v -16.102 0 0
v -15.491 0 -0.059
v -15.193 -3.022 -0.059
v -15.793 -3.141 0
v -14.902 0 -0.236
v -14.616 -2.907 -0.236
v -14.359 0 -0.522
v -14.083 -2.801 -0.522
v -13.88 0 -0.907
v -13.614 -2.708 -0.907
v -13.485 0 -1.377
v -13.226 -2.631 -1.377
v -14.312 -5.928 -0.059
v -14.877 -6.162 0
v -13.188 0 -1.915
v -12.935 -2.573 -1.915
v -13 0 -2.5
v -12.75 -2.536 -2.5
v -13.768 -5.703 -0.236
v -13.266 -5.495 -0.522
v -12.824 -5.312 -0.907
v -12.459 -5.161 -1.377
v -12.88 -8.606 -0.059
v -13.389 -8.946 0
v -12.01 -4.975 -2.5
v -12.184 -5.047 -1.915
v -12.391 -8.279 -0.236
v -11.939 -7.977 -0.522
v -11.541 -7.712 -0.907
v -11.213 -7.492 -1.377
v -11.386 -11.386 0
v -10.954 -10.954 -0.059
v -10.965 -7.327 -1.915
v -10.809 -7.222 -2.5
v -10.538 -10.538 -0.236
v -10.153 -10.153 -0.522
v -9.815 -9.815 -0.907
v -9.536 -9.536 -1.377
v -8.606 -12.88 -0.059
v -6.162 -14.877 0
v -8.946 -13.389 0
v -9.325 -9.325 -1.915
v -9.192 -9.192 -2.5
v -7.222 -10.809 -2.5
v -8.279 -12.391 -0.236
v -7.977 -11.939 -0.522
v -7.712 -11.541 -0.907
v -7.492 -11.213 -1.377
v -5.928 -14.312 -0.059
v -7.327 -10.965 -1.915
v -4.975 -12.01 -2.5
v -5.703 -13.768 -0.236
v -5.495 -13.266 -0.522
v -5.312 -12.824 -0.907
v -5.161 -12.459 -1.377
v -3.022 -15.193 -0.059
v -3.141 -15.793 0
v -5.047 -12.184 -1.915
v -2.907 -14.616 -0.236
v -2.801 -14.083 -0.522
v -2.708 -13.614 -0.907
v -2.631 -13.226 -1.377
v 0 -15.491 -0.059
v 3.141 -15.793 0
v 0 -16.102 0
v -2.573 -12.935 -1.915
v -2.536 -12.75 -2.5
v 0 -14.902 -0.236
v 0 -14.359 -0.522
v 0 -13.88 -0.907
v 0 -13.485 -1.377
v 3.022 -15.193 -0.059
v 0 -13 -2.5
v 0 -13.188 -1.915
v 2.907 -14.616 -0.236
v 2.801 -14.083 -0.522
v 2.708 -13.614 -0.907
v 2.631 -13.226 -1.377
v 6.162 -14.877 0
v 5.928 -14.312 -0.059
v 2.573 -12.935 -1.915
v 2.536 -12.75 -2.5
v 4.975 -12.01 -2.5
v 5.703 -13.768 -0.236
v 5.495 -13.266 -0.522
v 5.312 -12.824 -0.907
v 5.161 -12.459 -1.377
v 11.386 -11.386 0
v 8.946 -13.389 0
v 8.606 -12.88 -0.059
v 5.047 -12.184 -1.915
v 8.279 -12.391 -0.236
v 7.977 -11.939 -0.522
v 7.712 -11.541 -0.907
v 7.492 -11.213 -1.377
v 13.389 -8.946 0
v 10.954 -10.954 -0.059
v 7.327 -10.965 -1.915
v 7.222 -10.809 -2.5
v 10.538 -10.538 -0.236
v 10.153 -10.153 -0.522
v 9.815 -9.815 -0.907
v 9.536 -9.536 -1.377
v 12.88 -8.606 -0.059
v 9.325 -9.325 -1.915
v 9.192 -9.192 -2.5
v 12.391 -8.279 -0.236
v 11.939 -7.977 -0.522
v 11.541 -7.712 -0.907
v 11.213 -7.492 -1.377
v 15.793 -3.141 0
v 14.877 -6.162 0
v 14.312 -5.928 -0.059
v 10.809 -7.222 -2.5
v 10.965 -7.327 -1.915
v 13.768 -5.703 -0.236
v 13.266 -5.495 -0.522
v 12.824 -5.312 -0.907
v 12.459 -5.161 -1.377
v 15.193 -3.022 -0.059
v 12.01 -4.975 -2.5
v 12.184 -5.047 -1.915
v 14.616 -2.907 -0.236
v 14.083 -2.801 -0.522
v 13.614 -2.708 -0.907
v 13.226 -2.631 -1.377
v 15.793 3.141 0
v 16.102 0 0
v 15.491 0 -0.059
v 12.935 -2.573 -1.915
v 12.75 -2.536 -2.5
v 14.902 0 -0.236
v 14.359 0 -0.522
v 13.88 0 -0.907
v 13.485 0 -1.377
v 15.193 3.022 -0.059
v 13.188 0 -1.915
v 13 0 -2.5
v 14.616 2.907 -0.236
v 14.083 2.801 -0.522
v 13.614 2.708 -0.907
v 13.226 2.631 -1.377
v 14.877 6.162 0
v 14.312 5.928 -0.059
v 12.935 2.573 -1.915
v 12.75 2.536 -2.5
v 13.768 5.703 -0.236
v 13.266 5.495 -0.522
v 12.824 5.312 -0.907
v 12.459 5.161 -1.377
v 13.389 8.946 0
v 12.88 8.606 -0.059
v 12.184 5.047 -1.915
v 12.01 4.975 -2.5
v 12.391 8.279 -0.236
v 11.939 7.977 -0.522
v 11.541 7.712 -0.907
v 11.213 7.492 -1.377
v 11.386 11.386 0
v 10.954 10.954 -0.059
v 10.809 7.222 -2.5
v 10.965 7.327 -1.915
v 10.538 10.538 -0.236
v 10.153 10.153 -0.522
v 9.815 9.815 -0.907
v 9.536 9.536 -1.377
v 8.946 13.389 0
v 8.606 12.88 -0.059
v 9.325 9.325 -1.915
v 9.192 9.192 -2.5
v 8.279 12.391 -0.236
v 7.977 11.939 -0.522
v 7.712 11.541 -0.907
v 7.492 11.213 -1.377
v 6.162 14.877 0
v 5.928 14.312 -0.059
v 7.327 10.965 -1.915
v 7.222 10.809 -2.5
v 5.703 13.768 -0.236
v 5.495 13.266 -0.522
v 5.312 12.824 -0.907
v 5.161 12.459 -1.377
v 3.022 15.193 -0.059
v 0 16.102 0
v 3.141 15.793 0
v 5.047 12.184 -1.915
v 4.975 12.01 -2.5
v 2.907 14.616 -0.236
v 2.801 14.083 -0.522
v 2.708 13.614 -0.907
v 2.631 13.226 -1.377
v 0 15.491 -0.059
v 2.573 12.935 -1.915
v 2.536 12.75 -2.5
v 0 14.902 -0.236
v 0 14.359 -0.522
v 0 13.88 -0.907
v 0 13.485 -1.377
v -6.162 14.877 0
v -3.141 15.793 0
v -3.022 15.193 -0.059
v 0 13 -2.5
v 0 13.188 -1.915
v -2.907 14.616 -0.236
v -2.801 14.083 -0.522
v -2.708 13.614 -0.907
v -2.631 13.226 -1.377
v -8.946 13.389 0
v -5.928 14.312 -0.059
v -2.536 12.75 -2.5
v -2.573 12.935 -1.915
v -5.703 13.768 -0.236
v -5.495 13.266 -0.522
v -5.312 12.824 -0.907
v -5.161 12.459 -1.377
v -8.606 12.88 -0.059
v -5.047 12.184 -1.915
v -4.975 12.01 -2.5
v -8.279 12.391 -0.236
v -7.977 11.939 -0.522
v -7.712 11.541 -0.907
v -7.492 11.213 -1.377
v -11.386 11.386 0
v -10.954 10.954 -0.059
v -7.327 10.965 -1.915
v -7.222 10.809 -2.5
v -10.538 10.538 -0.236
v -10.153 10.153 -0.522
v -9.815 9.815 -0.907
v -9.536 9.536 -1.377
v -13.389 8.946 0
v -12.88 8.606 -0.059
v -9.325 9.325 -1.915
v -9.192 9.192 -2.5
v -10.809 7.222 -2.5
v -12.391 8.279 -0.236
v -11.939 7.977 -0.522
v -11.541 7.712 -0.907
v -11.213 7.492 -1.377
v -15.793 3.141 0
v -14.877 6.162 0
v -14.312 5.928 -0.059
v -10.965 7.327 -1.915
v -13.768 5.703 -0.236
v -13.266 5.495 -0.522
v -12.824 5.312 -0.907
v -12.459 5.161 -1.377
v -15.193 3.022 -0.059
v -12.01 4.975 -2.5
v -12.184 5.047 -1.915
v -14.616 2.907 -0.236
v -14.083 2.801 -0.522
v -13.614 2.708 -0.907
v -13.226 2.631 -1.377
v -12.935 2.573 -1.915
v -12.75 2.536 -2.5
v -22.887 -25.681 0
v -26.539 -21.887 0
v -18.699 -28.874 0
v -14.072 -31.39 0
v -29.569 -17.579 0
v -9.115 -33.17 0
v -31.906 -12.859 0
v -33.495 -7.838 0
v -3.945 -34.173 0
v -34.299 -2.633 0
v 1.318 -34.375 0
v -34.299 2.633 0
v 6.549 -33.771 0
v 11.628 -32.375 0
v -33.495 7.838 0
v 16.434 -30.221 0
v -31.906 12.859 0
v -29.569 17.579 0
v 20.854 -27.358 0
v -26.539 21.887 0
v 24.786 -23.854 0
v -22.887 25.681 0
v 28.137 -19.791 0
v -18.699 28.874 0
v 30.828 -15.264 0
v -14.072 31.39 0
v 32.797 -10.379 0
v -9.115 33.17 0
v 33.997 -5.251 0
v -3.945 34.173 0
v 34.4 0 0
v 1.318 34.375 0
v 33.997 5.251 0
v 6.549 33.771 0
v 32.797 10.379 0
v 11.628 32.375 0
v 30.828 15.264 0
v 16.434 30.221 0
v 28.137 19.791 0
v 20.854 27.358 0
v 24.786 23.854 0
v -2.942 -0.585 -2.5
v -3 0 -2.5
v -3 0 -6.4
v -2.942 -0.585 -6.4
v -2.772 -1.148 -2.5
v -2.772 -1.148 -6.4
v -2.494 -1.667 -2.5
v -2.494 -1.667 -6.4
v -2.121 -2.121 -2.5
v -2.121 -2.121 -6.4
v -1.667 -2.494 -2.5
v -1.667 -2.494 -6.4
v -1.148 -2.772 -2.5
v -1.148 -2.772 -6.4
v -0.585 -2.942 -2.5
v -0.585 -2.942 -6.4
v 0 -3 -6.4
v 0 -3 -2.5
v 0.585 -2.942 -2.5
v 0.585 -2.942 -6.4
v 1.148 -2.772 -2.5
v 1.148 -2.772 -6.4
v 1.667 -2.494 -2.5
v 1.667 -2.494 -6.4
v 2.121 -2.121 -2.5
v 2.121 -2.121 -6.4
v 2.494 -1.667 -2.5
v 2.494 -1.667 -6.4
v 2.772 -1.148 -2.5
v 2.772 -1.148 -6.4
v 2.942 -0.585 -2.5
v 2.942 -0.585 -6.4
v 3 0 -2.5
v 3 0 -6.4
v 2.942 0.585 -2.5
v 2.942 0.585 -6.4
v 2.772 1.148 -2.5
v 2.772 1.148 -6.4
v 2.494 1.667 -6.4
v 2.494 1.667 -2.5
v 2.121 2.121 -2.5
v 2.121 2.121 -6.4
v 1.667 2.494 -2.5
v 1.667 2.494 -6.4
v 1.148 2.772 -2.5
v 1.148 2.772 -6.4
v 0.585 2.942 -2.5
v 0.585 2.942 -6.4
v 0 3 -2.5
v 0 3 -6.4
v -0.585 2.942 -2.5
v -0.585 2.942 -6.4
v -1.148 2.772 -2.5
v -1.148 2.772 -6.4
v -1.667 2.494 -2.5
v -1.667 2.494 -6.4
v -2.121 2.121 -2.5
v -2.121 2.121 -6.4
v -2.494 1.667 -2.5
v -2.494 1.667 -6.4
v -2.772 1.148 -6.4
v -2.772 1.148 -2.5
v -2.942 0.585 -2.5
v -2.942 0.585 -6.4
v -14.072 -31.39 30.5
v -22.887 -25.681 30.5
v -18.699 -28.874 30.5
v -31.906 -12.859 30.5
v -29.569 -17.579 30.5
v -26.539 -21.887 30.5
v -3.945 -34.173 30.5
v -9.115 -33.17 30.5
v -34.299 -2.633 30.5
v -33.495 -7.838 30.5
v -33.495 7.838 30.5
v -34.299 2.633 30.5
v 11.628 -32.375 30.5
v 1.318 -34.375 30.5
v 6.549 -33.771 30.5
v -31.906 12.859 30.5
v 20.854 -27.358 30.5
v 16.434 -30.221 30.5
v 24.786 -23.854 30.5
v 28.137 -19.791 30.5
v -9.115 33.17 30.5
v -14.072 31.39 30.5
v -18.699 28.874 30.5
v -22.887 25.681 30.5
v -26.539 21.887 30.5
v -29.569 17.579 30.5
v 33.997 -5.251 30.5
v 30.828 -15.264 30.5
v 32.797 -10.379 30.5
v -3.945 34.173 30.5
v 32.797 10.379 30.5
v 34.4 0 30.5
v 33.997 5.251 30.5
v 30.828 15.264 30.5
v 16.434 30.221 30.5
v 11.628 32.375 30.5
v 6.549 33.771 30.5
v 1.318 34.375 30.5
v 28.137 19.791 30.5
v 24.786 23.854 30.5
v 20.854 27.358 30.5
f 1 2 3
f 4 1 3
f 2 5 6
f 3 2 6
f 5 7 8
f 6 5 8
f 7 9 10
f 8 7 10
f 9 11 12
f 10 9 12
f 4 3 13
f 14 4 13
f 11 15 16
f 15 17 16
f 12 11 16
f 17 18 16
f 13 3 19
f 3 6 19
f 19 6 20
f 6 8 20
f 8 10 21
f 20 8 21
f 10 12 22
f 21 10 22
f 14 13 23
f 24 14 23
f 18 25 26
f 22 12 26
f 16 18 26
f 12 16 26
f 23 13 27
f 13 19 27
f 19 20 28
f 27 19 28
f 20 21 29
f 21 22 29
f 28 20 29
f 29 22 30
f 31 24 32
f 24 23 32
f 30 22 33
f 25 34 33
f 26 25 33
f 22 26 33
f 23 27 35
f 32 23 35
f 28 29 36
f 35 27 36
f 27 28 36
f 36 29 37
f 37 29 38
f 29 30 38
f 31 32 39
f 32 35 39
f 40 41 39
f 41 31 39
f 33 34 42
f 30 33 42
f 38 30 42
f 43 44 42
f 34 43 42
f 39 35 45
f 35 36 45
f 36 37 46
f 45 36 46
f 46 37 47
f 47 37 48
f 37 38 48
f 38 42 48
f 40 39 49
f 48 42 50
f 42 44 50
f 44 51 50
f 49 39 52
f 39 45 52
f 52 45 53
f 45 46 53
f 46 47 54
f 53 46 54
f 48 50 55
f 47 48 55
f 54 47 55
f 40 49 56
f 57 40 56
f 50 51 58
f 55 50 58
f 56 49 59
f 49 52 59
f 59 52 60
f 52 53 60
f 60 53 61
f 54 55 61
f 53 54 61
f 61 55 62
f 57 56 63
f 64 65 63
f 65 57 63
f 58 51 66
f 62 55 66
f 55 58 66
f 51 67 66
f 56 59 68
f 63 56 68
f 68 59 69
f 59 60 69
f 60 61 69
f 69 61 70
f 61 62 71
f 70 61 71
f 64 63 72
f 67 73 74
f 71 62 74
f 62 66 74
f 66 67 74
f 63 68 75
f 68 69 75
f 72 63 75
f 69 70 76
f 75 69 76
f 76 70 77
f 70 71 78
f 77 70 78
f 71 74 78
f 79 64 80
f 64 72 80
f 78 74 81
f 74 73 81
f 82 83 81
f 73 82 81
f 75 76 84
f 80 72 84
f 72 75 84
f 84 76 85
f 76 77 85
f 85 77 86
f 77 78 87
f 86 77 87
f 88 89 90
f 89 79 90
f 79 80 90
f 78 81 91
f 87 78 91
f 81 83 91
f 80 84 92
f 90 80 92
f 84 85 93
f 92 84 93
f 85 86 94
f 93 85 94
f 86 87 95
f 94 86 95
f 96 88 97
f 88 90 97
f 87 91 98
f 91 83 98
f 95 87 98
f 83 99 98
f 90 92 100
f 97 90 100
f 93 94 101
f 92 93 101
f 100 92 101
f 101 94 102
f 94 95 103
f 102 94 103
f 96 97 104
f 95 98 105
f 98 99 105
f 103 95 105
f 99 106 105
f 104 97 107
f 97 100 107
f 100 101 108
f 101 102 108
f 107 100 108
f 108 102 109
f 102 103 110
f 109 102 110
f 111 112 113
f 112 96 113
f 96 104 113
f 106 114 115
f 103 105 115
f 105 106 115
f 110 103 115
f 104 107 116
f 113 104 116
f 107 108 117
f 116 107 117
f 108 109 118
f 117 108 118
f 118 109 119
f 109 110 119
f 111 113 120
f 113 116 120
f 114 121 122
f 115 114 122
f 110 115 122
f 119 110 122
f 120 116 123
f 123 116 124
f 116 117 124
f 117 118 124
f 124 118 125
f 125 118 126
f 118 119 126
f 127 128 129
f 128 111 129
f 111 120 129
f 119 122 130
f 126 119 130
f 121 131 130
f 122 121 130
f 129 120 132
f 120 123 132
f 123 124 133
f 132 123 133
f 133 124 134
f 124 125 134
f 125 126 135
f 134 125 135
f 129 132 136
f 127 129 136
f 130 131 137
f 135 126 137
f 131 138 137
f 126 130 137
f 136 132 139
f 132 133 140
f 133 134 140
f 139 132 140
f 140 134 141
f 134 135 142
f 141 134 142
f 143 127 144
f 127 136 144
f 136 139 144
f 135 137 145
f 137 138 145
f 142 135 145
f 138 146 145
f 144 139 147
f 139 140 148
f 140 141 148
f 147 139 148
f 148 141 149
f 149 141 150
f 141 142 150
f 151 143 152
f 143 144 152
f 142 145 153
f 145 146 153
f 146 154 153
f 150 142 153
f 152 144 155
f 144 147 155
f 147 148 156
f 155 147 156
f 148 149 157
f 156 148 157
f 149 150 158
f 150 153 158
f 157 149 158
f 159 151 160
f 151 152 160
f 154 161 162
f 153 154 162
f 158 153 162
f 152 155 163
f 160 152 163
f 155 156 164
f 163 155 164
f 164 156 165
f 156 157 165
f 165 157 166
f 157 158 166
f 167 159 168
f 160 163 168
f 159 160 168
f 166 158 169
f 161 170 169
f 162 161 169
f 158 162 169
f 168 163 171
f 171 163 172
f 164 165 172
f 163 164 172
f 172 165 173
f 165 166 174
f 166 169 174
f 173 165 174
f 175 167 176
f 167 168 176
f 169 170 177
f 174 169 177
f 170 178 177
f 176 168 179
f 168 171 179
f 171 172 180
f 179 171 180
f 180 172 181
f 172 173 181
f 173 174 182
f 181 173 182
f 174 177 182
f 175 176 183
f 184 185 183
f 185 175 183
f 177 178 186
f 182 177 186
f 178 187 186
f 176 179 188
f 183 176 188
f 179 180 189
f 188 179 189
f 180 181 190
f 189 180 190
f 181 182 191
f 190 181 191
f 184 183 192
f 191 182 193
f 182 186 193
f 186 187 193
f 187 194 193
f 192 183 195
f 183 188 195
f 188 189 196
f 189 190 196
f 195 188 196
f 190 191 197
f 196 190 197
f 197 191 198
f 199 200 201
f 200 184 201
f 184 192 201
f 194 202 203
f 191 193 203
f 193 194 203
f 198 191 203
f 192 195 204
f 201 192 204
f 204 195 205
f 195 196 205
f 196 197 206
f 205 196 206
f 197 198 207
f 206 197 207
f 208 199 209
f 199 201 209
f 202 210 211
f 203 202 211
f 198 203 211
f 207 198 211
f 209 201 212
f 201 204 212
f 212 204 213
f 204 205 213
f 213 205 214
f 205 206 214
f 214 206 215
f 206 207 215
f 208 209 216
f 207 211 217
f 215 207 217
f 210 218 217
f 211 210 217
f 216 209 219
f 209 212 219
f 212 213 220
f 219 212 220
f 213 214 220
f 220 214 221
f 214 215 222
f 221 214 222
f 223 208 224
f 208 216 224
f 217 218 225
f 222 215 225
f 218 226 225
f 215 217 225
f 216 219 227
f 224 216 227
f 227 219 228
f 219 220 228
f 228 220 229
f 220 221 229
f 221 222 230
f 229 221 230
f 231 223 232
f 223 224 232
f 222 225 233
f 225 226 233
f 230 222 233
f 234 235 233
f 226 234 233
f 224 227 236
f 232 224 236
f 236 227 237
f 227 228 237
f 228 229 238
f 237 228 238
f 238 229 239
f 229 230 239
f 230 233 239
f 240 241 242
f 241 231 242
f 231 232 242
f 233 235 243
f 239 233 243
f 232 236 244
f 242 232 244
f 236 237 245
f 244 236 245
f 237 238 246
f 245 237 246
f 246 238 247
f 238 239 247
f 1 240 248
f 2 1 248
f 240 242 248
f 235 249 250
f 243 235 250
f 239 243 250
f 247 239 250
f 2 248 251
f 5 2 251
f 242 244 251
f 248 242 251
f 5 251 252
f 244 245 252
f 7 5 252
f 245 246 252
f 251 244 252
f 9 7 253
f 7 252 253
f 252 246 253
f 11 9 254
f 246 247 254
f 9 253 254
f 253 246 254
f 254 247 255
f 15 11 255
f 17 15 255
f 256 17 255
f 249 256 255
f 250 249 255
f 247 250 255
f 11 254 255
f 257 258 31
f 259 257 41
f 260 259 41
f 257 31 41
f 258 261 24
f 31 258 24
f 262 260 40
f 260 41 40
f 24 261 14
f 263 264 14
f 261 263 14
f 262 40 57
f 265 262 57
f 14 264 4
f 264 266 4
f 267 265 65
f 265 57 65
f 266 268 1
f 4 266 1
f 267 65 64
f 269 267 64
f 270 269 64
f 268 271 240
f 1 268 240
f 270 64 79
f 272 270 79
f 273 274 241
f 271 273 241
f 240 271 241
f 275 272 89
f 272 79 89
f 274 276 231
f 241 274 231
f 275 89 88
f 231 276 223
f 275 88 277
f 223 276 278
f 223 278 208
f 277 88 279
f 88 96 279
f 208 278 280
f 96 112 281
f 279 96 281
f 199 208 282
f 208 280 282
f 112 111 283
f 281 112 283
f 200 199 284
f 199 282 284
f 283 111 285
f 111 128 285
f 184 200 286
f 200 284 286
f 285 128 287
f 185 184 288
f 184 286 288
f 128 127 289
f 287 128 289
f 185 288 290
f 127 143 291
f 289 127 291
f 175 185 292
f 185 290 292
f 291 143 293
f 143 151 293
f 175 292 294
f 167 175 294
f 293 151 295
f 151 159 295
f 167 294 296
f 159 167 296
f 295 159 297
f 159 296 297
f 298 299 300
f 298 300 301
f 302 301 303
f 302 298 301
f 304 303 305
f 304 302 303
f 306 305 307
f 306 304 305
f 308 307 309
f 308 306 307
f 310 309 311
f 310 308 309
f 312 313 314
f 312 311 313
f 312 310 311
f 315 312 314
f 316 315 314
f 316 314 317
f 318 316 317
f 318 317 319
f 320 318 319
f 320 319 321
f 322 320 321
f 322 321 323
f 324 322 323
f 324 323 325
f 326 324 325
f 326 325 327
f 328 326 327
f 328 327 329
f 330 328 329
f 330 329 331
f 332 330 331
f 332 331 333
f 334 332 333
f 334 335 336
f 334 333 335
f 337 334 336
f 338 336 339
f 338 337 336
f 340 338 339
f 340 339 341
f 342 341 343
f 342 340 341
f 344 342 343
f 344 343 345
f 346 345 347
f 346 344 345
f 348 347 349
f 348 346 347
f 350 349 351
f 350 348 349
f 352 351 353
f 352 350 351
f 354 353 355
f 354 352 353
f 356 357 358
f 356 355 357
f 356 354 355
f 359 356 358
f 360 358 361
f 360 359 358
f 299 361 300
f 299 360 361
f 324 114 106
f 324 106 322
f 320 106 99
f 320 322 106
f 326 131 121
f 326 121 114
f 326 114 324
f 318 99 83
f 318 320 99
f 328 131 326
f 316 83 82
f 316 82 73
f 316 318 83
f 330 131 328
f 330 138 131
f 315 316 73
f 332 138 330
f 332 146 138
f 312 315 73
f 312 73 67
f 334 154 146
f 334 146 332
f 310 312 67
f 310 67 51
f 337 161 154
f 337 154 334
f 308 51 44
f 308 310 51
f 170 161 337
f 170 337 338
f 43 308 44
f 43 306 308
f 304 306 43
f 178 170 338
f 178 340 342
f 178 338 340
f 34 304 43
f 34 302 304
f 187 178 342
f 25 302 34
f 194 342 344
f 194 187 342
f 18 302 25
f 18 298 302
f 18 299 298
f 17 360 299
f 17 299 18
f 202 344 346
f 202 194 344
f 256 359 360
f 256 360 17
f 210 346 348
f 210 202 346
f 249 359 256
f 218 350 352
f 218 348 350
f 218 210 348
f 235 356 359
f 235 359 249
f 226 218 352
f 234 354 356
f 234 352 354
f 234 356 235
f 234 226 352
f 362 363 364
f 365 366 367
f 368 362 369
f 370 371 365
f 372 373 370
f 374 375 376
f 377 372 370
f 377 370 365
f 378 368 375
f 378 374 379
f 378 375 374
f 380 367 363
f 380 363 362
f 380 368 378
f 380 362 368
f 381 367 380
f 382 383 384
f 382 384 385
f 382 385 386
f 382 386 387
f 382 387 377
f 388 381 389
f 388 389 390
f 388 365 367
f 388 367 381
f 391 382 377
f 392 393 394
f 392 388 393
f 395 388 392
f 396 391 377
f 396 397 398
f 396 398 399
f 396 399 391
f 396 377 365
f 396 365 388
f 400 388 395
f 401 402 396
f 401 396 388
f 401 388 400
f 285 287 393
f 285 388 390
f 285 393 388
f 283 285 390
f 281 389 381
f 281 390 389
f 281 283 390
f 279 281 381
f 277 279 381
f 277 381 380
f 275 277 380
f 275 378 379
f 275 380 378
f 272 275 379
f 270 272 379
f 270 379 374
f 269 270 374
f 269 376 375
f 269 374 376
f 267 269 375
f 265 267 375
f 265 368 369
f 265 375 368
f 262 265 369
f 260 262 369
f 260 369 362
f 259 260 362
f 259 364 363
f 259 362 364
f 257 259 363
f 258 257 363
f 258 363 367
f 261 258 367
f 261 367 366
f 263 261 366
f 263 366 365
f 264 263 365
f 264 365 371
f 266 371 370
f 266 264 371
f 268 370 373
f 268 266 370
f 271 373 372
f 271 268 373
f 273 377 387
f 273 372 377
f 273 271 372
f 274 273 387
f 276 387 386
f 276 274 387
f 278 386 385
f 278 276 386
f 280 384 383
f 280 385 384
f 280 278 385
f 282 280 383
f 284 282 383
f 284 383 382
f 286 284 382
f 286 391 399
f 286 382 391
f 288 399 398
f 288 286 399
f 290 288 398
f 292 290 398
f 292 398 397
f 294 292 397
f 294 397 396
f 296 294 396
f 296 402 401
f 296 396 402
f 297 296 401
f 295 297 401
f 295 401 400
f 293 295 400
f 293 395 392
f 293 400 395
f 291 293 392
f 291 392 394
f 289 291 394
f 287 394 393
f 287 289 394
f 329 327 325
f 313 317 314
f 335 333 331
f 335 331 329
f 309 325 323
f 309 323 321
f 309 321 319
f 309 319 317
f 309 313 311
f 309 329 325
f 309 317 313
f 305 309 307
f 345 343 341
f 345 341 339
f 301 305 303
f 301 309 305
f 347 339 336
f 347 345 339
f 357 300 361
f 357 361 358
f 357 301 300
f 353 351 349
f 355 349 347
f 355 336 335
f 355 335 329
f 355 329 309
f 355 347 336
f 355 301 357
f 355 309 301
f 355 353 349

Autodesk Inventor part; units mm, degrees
ref_plane "YZ Plane" through (0, 0, 0) normal (1, 0, 0) x (0, 1, 0)
ref_plane "XZ Plane" through (0, 0, 0) normal (0, 1, 0) x (-1, 0, 0)
ref_plane "XY Plane" through (0, 0, 0) normal (0, 0, 1) x (1, 0, 0)
sketch "Sketch1" plane through (0, 0, 0) normal (0, 0, 1) x (1, 0, 0)
  circle A0 centre (0, 0) radius 34.4
  dimension "d0" = 68.8
extrude "Extrusion1" add sketch "Sketch1" along normal blind 30.5
sketch "Sketch2" plane through (0, 0, 0) normal (0, 0, -1) x (-1, 0, 0)
  circle A0 centre (0, 0) radius 13
  dimension "d3" = 26
extrude "Extrusion2" add sketch "Sketch2" along normal blind 2.5
sketch "Sketch3" plane through (0, 0, -2.5) normal (0, 0, -1) x (-1, 0, 0)
  circle A0 centre (0, 0) radius 3
  dimension "d6" = 6
extrude "Extrusion3" add sketch "Sketch3" along normal blind 3.9
fillet "Fillet1" radius 3.175 1 edges at (13, 0, 0)
properties part number "Motor" material "Copper"
